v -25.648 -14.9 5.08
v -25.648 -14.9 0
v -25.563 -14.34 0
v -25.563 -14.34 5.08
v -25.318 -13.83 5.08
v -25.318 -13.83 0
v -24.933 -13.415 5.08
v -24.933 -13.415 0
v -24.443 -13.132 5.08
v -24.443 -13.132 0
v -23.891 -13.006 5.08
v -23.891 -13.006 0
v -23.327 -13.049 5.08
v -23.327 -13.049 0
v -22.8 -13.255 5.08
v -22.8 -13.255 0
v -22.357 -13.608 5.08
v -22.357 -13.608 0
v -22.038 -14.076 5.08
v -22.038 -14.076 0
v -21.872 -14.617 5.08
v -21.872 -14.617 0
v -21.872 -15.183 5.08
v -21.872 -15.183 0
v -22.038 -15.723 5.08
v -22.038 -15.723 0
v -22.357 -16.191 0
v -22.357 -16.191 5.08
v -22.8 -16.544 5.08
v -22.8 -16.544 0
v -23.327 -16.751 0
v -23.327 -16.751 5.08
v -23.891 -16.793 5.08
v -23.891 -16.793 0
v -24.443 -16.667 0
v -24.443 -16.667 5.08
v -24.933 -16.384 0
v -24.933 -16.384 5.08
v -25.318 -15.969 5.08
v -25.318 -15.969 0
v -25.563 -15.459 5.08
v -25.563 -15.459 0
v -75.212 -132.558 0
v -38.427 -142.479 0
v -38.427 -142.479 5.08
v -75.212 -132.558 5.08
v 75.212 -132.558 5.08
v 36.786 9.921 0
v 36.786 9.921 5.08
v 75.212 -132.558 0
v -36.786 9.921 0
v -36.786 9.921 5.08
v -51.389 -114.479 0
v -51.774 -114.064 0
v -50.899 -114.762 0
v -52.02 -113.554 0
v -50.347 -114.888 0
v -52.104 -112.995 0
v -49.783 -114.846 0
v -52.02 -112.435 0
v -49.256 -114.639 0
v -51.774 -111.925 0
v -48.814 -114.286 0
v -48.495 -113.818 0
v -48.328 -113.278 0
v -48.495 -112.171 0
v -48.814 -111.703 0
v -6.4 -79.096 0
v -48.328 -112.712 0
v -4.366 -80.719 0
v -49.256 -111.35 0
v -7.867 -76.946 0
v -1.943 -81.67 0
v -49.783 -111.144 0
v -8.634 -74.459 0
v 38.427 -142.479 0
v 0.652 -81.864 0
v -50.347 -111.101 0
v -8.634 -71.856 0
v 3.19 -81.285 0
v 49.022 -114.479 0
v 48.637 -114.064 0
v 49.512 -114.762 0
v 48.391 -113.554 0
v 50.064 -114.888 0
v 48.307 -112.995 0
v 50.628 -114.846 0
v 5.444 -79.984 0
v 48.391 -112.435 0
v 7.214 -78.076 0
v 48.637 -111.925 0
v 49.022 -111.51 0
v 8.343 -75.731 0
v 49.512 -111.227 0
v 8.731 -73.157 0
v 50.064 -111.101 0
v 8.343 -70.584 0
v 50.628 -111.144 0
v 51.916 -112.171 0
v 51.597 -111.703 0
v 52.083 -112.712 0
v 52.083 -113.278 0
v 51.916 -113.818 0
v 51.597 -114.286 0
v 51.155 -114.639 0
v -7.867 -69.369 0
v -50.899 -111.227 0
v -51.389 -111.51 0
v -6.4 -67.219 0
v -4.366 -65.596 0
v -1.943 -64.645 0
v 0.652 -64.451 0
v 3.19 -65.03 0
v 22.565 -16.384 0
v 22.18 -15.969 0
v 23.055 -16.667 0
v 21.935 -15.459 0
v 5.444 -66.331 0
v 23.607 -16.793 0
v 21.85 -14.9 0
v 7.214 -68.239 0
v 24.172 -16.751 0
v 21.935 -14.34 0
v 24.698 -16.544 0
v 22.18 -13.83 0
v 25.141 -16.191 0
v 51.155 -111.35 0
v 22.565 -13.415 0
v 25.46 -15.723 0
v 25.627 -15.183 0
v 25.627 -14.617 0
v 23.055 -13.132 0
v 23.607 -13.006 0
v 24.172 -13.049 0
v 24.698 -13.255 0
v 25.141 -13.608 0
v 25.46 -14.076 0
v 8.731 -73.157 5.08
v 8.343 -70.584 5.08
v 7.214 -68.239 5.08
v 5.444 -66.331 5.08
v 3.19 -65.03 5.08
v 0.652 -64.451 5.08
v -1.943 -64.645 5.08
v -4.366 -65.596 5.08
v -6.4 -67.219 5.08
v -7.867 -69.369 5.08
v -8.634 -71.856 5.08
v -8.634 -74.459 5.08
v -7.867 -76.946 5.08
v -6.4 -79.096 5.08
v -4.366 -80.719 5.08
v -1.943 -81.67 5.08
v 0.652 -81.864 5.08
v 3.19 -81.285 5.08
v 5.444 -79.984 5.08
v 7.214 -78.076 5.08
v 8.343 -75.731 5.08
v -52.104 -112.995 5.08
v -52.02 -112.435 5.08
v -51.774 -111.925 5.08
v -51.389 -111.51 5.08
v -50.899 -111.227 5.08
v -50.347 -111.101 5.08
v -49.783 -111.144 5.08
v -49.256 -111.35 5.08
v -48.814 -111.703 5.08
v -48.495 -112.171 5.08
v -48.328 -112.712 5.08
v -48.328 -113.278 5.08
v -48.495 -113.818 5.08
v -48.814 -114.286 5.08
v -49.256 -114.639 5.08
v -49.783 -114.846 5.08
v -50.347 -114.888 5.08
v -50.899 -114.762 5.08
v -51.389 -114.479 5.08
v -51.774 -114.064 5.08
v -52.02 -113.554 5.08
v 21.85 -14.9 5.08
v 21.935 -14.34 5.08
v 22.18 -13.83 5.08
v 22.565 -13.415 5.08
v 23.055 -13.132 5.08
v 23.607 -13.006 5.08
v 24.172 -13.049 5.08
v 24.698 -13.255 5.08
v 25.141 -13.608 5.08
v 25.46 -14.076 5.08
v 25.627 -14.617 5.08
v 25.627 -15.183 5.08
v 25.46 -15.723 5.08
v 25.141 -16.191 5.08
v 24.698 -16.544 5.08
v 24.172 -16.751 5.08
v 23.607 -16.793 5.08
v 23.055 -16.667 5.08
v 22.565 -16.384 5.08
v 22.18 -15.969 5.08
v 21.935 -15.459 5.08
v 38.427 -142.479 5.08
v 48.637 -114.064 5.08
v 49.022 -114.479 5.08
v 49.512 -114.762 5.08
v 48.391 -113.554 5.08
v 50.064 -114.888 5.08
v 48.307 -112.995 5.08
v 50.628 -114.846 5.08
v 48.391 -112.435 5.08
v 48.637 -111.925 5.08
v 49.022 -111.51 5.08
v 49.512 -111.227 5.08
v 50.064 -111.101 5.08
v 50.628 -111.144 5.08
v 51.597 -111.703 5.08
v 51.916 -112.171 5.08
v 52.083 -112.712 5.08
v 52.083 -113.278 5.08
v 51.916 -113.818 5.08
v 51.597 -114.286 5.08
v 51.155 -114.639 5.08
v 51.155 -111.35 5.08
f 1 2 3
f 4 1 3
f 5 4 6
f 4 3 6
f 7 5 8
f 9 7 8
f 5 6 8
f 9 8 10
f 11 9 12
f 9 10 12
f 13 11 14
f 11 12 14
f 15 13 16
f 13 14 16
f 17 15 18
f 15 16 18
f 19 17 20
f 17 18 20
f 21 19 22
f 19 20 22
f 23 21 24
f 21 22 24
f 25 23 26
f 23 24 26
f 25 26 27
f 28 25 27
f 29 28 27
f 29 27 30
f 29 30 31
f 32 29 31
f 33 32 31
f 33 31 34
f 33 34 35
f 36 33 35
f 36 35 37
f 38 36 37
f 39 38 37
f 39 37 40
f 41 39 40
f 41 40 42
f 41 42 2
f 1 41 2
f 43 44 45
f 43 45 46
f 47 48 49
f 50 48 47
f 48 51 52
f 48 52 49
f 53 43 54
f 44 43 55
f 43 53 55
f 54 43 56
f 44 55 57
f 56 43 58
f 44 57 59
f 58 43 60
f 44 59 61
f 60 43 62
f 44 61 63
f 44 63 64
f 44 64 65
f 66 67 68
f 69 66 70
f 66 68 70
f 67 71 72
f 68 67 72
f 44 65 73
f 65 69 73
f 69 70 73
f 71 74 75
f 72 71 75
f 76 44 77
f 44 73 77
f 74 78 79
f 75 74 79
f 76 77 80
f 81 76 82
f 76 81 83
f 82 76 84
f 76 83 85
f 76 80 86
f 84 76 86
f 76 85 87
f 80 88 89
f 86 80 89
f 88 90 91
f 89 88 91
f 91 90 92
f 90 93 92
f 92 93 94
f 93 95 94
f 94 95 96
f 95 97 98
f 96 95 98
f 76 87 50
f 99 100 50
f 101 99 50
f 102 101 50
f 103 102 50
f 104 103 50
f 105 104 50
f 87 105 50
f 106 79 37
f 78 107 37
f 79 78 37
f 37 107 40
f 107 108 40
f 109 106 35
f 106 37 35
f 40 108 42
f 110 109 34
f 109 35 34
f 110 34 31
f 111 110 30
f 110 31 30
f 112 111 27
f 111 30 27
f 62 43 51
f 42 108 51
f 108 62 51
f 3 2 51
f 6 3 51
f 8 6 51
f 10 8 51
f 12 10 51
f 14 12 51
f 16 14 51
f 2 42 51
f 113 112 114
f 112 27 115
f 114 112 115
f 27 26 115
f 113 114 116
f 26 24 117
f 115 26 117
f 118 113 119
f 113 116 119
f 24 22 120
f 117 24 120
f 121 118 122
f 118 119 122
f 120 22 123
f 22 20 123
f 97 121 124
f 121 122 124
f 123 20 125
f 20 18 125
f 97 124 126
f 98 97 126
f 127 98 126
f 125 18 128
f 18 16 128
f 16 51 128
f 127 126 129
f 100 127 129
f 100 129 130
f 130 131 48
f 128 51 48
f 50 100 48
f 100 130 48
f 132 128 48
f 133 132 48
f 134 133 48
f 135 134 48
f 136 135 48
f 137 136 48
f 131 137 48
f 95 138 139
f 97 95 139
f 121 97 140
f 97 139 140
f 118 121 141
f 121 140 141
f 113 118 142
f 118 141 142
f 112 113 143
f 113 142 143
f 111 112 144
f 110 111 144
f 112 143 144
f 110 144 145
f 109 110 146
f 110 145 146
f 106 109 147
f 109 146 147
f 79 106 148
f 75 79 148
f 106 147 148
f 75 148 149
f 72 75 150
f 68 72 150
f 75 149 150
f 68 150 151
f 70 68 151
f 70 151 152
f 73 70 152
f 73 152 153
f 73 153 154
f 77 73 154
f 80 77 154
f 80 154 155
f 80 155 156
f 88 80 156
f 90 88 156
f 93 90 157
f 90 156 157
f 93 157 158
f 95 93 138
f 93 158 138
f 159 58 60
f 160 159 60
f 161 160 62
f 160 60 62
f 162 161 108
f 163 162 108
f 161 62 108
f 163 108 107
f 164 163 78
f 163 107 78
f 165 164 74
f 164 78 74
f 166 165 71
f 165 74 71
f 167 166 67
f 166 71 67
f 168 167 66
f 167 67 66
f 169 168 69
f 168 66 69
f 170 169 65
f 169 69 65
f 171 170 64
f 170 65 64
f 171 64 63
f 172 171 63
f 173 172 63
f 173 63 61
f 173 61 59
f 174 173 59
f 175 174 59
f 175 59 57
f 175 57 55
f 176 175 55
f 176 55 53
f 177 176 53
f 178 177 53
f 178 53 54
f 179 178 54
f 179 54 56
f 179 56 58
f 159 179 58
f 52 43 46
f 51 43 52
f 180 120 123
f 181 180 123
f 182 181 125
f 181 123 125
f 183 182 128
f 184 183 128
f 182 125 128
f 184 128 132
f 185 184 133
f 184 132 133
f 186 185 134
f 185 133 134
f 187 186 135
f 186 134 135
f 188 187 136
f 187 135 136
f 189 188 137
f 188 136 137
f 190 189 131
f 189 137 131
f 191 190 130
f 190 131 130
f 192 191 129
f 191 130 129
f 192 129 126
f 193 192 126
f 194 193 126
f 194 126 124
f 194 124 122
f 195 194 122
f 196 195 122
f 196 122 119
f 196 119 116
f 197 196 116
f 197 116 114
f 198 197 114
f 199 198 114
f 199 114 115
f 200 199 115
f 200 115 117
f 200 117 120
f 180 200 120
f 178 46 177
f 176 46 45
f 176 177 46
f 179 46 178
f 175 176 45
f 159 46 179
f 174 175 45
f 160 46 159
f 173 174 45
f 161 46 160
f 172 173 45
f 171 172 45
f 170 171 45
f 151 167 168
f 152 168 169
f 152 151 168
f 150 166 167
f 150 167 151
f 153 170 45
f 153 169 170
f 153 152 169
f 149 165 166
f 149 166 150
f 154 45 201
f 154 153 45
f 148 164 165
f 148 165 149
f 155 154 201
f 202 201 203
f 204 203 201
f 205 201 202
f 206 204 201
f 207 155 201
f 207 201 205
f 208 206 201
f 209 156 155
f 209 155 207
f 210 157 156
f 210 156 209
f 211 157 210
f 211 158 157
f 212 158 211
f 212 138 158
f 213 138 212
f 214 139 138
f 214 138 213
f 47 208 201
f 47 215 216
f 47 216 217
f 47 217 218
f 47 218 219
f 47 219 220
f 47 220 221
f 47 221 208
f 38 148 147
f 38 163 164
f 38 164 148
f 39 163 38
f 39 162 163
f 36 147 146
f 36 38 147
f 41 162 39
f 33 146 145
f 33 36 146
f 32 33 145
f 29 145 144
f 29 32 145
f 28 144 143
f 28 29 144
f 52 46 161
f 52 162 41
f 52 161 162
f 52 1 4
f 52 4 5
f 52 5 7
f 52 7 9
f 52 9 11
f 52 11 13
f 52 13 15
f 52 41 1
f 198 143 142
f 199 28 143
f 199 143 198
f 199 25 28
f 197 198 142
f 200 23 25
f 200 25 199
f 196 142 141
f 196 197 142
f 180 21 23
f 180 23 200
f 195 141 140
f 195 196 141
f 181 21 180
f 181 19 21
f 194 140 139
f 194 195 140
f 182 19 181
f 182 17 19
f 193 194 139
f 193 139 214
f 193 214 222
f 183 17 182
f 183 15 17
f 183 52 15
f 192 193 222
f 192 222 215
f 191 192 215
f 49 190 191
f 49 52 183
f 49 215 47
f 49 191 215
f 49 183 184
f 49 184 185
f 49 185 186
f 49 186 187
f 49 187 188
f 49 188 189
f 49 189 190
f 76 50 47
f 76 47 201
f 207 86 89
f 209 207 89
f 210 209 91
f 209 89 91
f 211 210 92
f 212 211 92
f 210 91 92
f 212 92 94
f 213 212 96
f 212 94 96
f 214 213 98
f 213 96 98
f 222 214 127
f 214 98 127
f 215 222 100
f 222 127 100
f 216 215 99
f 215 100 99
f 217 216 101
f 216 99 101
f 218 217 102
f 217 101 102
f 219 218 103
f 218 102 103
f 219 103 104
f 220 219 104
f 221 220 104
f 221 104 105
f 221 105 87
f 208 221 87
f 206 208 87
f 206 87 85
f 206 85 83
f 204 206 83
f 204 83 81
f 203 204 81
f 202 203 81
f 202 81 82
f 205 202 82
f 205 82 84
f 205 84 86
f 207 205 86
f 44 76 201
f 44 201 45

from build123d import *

# Parameters (mm, degrees)
BOSS_EXTRUDE1_DEPTH   = 5.08
SKETCH2_R             = 19.05
SKETCH2_R_2           = 5.55625
CUT_EXTRUDE1_DEPTH    = 6.08
F_6_CLEARANCE_HOLE1_D = 3.7973
SKETCH5_R             = 19.05
SKETCH5_R_2           = 8.73125
SKETCH5_R_3           = 5.55625
BOSS_EXTRUDE2_DEPTH   = 5.08


with BuildPart() as part:
    # Sketch1 → Boss-Extrude1 (new body)
    with BuildSketch(Plane.XY):
        Polygon((-36.785608025, 9.921141176), (36.785608025, 9.921141176), (75.212399069, -132.557717648), (38.426791044, -142.478858824), (-38.426791044, -142.478858824), (-75.212399069, -132.557717648), align=None)
    extrude(amount=BOSS_EXTRUDE1_DEPTH)

    # Sketch2 → Cut-Extrude1 (cut, through all)
    with BuildSketch(Plane.XY.offset(5.08)):
        with Locations((0, -73.157410737)):
            Circle(SKETCH2_R)
        with Locations((-36.5125, -73.157410737)):
            Circle(SKETCH2_R_2)
        with Locations((36.5125, -73.157410737)):
            Circle(SKETCH2_R_2)
    extrude(amount=-CUT_EXTRUDE1_DEPTH, mode=Mode.SUBTRACT)

    # #6 Clearance Hole1 (through all)
    with Locations(Plane.XY.offset(5.08)):
        with Locations((50.205500939, -112.994549553), (-50.205500939, -112.994549553), (-23.749124469, -14.899594819), (23.749124469, -14.899594819)):
            Hole(F_6_CLEARANCE_HOLE1_D / 2)

    # Sketch5 → Boss-Extrude2 (add)
    with BuildSketch(Plane.XY.offset(5.08)):
        with Locations((0, -73.157410737)):
            Circle(SKETCH5_R)
        with Locations((0, -73.157410737)):
            Circle(SKETCH5_R_2, mode=Mode.SUBTRACT)
        with Locations((36.5125, -73.157410737)):
            Circle(SKETCH5_R_3)
        with Locations((-36.5125, -73.157410737)):
            Circle(SKETCH5_R_3)
    extrude(amount=-BOSS_EXTRUDE2_DEPTH)


solid = part.part
